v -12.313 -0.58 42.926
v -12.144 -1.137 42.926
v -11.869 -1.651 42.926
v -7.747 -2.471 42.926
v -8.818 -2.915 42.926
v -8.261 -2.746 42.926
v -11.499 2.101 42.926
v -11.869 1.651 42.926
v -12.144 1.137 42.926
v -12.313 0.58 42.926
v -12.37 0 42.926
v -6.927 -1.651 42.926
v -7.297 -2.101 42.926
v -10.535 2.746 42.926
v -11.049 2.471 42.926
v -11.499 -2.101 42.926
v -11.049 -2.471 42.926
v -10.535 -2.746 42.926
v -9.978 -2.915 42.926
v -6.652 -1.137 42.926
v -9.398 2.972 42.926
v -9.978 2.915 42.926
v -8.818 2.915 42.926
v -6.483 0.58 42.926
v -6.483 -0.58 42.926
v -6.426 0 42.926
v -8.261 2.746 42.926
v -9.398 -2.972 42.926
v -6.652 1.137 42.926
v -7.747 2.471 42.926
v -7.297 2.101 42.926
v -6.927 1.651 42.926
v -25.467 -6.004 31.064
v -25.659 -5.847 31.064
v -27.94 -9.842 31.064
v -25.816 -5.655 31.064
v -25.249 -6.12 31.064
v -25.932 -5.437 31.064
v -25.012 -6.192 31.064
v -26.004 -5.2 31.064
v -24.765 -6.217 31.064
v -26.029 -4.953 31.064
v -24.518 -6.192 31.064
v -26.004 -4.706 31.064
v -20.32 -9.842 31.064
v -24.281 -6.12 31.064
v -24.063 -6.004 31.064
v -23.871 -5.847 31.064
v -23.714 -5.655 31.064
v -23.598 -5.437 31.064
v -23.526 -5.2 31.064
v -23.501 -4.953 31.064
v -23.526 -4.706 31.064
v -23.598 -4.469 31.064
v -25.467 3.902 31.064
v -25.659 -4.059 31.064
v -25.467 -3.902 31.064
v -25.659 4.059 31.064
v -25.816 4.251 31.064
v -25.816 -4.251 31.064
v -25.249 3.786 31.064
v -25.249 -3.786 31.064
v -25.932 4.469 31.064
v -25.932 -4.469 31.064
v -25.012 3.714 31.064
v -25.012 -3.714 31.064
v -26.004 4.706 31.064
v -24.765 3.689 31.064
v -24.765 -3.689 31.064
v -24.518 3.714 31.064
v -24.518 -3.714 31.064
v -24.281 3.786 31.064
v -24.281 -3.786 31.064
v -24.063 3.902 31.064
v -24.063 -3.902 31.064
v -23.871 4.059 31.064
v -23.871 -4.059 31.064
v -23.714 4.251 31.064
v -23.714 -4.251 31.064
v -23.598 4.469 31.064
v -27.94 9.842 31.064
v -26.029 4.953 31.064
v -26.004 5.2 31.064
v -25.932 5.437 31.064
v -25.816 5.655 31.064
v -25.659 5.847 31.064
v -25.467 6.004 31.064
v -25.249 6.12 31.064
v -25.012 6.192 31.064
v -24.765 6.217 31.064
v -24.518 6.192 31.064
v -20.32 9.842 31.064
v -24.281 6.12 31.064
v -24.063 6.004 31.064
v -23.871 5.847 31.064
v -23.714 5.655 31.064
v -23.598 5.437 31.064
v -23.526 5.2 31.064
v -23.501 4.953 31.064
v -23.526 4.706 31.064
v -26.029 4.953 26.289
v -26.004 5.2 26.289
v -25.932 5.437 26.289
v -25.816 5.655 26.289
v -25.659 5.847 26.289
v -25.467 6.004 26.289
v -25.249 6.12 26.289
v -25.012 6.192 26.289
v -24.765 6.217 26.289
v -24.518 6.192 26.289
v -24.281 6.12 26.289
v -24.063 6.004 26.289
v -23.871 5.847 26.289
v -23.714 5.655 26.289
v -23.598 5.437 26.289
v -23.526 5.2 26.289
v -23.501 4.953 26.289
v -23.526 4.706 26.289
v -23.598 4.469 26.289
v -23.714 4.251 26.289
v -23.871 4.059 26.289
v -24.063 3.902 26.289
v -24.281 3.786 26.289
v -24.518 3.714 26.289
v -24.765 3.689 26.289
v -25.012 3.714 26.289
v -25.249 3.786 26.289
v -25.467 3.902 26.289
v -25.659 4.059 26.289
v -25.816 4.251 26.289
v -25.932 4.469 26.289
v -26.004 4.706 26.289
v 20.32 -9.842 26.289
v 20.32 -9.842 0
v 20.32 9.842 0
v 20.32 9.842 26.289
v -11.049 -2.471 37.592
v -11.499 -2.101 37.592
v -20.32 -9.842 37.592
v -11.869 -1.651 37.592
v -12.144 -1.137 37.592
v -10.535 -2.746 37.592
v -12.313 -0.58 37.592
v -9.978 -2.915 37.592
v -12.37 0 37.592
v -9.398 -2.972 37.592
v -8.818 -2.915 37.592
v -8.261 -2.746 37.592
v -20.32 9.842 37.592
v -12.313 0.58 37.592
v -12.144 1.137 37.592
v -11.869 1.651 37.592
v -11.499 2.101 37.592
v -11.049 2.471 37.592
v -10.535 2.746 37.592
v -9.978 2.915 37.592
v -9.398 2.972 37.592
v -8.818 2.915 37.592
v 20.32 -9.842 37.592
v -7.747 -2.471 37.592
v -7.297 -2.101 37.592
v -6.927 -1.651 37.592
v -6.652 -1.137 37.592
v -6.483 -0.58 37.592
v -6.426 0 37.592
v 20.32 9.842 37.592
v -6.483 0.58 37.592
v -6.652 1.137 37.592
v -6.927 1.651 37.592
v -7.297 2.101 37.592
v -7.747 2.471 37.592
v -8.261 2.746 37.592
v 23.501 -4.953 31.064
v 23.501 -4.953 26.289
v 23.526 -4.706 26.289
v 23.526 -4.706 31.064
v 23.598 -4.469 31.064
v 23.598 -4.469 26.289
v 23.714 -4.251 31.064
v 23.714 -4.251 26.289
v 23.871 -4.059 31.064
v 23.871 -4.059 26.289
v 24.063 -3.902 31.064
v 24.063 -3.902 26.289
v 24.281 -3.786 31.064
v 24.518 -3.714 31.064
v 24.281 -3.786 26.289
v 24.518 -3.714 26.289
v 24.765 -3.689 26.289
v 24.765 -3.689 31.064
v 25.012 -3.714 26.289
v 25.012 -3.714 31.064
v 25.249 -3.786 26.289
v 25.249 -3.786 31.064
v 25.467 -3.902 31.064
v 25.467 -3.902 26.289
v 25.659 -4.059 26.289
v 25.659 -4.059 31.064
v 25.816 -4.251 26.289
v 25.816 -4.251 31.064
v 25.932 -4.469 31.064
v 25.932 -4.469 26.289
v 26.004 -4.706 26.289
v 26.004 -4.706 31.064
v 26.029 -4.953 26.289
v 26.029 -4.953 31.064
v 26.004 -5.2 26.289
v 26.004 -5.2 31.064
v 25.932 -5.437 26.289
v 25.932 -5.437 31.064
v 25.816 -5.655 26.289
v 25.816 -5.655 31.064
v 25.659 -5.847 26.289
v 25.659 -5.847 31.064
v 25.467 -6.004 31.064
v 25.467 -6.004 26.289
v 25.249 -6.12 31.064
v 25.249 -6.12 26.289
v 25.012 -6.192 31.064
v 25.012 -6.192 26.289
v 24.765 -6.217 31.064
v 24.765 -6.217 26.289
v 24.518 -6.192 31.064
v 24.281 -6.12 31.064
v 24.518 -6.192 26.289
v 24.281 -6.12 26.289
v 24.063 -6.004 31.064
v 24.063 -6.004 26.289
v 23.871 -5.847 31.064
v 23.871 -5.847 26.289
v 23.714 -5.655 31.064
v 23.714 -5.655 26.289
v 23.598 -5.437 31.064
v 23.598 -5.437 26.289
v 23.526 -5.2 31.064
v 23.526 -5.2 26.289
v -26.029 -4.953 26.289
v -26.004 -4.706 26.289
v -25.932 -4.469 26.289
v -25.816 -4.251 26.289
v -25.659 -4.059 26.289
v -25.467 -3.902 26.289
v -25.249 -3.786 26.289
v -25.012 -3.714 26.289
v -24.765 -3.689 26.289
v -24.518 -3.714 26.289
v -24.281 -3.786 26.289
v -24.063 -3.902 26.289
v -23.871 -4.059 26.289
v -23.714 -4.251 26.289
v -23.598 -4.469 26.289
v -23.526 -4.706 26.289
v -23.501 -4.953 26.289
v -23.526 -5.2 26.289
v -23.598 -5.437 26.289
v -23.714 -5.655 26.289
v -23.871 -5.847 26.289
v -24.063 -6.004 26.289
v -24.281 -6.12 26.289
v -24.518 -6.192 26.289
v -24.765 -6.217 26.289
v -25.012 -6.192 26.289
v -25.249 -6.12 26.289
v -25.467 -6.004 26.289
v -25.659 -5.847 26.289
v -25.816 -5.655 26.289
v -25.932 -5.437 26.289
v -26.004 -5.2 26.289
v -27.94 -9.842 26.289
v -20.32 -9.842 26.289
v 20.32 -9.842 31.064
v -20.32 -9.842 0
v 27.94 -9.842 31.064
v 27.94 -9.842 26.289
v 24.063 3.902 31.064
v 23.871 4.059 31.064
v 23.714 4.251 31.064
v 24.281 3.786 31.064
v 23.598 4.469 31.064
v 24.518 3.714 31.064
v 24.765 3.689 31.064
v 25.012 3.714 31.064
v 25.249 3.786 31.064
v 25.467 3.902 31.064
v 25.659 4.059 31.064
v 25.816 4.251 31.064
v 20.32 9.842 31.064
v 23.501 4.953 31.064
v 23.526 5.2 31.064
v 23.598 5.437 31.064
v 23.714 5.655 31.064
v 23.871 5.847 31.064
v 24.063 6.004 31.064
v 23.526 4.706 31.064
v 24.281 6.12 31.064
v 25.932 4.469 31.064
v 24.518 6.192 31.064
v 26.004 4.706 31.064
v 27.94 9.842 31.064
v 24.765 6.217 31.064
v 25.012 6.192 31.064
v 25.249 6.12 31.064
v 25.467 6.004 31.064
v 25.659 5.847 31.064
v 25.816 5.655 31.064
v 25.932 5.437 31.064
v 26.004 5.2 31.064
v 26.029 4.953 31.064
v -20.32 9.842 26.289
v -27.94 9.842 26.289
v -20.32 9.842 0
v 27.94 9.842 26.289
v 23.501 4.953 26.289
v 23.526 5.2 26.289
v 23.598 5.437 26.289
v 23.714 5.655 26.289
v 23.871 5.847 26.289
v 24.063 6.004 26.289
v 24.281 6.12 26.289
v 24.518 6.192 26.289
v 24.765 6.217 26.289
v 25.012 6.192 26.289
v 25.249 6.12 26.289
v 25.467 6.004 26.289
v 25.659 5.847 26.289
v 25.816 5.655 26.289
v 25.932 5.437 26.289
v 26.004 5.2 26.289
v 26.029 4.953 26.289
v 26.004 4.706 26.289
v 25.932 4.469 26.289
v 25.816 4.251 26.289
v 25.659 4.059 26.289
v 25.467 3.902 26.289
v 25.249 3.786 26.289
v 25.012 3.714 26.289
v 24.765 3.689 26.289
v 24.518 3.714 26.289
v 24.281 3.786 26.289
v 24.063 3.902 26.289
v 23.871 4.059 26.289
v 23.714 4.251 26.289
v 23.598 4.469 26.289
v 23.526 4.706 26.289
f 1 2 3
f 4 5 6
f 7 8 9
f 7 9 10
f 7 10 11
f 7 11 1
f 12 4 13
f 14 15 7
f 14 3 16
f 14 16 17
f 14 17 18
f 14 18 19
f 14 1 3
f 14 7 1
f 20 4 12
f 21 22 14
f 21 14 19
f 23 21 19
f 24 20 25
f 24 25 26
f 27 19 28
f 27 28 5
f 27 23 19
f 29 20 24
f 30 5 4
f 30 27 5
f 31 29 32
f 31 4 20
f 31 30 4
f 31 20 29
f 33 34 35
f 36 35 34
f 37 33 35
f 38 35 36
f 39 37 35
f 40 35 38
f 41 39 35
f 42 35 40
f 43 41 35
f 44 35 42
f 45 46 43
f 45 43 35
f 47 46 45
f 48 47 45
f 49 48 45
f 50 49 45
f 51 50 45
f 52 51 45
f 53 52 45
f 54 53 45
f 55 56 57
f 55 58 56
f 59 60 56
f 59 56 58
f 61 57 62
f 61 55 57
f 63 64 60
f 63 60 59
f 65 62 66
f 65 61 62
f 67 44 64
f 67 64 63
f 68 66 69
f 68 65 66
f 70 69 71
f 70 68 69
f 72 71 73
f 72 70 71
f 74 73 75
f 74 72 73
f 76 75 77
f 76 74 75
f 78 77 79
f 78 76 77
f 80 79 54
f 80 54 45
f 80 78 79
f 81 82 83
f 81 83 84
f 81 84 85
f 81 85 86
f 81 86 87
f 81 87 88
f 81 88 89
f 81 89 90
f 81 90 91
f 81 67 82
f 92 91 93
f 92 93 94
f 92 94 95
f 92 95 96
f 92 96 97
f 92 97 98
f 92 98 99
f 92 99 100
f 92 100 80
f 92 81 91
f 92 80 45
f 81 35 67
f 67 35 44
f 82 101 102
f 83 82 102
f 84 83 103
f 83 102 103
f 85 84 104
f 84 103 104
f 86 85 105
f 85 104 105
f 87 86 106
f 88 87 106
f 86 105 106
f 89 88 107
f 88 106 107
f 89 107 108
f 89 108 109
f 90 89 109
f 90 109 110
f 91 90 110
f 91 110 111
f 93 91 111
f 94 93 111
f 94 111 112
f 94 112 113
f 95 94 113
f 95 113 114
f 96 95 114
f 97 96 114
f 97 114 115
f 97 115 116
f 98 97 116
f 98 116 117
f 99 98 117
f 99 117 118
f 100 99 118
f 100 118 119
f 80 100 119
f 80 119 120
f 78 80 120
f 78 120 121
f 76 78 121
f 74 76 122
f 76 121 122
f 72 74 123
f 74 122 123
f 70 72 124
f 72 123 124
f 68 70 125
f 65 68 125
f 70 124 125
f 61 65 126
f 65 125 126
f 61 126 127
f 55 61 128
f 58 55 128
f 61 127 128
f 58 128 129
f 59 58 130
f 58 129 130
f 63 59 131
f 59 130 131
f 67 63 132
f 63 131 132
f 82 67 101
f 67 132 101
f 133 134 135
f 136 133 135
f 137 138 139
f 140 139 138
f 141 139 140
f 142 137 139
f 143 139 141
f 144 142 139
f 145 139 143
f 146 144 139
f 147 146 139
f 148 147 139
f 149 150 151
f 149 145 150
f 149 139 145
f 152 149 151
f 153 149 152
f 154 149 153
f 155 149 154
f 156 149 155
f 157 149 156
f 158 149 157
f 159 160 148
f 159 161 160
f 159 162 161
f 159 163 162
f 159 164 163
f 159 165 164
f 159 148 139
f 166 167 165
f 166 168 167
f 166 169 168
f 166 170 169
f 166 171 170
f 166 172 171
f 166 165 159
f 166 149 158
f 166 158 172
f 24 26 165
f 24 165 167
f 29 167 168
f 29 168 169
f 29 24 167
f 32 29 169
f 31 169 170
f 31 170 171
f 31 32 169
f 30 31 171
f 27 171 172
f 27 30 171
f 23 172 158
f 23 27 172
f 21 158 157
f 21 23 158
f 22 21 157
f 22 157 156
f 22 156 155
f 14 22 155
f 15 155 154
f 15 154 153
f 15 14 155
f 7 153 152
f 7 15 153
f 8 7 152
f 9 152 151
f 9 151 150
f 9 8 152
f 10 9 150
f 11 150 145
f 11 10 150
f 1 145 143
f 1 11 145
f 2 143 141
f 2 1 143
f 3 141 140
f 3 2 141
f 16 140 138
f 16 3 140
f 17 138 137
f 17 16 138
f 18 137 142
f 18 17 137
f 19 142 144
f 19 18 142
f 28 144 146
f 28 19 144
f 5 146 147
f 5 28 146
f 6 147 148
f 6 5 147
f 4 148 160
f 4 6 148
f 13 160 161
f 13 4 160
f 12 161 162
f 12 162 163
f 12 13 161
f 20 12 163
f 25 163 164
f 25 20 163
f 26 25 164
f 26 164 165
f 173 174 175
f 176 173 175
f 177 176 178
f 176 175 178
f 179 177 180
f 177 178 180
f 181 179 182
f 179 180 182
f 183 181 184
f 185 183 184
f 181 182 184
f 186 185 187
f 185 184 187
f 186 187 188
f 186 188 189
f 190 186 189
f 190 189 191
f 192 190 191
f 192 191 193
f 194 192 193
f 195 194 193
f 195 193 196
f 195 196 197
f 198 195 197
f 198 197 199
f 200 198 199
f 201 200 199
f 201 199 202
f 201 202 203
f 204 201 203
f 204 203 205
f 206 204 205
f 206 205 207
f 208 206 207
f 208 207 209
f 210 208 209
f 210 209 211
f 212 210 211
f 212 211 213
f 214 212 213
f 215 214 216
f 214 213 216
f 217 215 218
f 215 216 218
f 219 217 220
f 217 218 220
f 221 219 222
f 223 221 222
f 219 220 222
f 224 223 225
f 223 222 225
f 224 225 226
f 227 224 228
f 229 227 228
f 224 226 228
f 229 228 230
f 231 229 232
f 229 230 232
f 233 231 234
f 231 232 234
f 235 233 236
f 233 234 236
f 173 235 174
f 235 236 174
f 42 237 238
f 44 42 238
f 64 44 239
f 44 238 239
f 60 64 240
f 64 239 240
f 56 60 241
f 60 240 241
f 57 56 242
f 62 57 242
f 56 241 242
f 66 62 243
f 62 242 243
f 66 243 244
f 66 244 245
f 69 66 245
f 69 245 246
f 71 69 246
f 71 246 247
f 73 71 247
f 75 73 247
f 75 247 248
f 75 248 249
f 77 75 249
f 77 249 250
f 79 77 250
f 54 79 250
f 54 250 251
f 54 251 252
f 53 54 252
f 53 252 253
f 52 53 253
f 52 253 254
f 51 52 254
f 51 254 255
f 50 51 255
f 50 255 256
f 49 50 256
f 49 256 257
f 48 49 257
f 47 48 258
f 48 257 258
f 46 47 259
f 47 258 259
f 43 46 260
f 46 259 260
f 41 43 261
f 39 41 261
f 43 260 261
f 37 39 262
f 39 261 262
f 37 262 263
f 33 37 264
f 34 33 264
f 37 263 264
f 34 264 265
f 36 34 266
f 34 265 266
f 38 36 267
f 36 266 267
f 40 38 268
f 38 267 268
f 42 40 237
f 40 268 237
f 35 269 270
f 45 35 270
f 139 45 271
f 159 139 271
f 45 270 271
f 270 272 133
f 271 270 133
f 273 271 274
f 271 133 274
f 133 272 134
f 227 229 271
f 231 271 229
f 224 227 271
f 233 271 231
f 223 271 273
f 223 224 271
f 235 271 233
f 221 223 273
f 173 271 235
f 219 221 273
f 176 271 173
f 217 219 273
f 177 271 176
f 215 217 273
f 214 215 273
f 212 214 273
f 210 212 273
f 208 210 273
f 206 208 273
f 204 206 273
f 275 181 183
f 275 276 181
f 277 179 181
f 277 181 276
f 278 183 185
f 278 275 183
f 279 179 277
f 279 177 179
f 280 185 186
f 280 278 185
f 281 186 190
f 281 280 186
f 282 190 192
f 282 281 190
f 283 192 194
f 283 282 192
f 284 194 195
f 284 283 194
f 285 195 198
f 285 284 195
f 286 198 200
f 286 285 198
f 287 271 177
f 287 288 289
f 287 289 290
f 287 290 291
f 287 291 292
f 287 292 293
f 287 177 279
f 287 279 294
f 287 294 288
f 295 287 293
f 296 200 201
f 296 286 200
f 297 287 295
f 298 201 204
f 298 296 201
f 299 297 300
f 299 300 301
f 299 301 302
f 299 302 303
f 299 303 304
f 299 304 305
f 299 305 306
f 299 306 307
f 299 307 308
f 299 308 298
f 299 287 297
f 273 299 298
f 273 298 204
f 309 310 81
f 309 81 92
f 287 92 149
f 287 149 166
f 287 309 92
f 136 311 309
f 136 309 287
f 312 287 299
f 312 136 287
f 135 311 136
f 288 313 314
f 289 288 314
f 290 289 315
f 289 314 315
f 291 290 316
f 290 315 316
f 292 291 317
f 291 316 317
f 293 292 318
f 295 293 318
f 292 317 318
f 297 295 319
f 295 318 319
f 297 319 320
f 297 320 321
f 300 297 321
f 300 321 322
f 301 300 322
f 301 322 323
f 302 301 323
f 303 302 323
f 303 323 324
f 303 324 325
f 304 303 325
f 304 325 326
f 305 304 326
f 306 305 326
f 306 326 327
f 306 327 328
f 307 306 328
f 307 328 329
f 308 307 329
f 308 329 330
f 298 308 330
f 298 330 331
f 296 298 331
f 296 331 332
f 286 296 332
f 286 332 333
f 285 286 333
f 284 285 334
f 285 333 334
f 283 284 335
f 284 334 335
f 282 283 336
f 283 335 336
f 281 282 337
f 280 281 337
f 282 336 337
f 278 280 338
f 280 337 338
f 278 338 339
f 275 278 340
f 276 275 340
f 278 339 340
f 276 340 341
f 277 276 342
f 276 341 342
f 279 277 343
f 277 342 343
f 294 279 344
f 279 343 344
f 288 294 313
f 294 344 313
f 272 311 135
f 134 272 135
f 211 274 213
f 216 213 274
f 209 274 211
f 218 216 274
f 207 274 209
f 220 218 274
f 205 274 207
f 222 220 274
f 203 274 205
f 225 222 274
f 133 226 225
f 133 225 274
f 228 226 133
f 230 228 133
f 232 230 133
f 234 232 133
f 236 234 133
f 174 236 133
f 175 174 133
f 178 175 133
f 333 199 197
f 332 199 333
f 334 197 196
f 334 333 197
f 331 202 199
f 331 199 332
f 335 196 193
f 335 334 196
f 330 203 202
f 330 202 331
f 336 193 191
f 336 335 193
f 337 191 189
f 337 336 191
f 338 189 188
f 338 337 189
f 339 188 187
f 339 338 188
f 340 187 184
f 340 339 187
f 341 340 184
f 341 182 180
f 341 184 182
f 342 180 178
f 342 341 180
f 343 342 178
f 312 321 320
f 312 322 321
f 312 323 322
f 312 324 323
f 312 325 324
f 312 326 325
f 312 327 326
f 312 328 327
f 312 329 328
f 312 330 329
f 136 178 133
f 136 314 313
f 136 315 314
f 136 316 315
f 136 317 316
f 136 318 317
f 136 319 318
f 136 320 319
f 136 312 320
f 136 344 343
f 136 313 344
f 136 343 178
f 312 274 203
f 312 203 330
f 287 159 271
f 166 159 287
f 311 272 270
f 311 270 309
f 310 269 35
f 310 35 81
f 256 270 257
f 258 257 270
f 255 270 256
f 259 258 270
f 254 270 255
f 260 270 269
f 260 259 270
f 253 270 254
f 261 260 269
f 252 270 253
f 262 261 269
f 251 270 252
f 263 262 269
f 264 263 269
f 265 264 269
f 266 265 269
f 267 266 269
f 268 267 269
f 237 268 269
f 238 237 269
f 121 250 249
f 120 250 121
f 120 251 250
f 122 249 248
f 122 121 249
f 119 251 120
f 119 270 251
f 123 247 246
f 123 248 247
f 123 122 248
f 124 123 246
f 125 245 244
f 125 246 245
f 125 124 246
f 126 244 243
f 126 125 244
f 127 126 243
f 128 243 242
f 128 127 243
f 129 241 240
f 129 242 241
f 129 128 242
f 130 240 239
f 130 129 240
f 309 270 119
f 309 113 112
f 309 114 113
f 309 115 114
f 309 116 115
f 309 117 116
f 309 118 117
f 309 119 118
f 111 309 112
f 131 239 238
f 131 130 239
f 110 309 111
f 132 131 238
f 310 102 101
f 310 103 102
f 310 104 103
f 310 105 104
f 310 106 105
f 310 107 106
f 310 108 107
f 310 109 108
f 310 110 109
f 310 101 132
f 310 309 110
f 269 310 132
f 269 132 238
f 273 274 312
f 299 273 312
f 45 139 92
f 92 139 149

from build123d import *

# Parameters (mm, degrees)
SKETCH1_W                        = 55.88
SKETCH1_H                        = 19.685
EXTRUDE1_DEPTH                   = 42.926
SKETCH3_OUTSIDE_W                = 72.512
SKETCH3_OUTSIDE_H                = 36.318
SKETCH3_OUTSIDE_R                = 2.9718
EXTRUDE2_DEPTH                   = 5.334
SKETCH8_W                        = 7.62
SKETCH8_H                        = 19.685
EXTRUDE5_DEPTH                   = 26.289
F_39_0_0995_DIAMETER_HOLE1_D     = 2.5273
F_39_0_0995_DIAMETER_HOLE1_DEPTH = 12.7
F_39_0_0995_DIAMETER_HOLE1_TIP   = 0.759277521
SKETCH13_W                       = 7.62
SKETCH13_H                       = 19.685
EXTRUDE6_DEPTH                   = 6.5278


with BuildPart() as part:
    # Sketch1 → Extrude1 (new body)
    with BuildSketch(Plane.XY):
        Rectangle(SKETCH1_W, SKETCH1_H)
    extrude(amount=EXTRUDE1_DEPTH)

    # Sketch3 outside → Extrude2 (cut)
    with BuildSketch(Plane.XY.offset(42.926)):
        Rectangle(SKETCH3_OUTSIDE_W, SKETCH3_OUTSIDE_H)
        with Locations((-9.398, 0)):
            Circle(SKETCH3_OUTSIDE_R, mode=Mode.SUBTRACT)
    extrude(amount=-EXTRUDE2_DEPTH, mode=Mode.SUBTRACT)

    # Sketch8 → Extrude5 (cut)
    with BuildSketch(Plane(origin=(0, 0, 0), x_dir=(-1, 0, 0), z_dir=(0, 0, -1))):
        with Locations((-24.13, 0)):
            Rectangle(SKETCH8_W, SKETCH8_H)
        with Locations((24.13, 0)):
            Rectangle(SKETCH8_W, SKETCH8_H)
    extrude(amount=-EXTRUDE5_DEPTH, mode=Mode.SUBTRACT)

    # #39 (0.0995) Diameter Hole1
    with Locations(Plane(origin=(-24.765, 4.953, 37.592), x_dir=(1, 0, 0), z_dir=(0, 0, 1))):
        with Locations((0, 0), (0, -9.906), (49.53, 0), (49.53, -9.906)):
            Hole(F_39_0_0995_DIAMETER_HOLE1_D / 2, depth=F_39_0_0995_DIAMETER_HOLE1_DEPTH)
            with Locations((0, 0, -(F_39_0_0995_DIAMETER_HOLE1_DEPTH + F_39_0_0995_DIAMETER_HOLE1_TIP / 2))):  # 118° drill point
                Cone(0, F_39_0_0995_DIAMETER_HOLE1_D / 2, F_39_0_0995_DIAMETER_HOLE1_TIP, mode=Mode.SUBTRACT)

    # Sketch13 → Extrude6 (cut)
    with BuildSketch(Plane.XY.offset(37.592)):
        with Locations((-24.13, 0)):
            Rectangle(SKETCH13_W, SKETCH13_H)
        with Locations((24.13, 0)):
            Rectangle(SKETCH13_W, SKETCH13_H)
    extrude(amount=-EXTRUDE6_DEPTH, mode=Mode.SUBTRACT)


solid = part.part
